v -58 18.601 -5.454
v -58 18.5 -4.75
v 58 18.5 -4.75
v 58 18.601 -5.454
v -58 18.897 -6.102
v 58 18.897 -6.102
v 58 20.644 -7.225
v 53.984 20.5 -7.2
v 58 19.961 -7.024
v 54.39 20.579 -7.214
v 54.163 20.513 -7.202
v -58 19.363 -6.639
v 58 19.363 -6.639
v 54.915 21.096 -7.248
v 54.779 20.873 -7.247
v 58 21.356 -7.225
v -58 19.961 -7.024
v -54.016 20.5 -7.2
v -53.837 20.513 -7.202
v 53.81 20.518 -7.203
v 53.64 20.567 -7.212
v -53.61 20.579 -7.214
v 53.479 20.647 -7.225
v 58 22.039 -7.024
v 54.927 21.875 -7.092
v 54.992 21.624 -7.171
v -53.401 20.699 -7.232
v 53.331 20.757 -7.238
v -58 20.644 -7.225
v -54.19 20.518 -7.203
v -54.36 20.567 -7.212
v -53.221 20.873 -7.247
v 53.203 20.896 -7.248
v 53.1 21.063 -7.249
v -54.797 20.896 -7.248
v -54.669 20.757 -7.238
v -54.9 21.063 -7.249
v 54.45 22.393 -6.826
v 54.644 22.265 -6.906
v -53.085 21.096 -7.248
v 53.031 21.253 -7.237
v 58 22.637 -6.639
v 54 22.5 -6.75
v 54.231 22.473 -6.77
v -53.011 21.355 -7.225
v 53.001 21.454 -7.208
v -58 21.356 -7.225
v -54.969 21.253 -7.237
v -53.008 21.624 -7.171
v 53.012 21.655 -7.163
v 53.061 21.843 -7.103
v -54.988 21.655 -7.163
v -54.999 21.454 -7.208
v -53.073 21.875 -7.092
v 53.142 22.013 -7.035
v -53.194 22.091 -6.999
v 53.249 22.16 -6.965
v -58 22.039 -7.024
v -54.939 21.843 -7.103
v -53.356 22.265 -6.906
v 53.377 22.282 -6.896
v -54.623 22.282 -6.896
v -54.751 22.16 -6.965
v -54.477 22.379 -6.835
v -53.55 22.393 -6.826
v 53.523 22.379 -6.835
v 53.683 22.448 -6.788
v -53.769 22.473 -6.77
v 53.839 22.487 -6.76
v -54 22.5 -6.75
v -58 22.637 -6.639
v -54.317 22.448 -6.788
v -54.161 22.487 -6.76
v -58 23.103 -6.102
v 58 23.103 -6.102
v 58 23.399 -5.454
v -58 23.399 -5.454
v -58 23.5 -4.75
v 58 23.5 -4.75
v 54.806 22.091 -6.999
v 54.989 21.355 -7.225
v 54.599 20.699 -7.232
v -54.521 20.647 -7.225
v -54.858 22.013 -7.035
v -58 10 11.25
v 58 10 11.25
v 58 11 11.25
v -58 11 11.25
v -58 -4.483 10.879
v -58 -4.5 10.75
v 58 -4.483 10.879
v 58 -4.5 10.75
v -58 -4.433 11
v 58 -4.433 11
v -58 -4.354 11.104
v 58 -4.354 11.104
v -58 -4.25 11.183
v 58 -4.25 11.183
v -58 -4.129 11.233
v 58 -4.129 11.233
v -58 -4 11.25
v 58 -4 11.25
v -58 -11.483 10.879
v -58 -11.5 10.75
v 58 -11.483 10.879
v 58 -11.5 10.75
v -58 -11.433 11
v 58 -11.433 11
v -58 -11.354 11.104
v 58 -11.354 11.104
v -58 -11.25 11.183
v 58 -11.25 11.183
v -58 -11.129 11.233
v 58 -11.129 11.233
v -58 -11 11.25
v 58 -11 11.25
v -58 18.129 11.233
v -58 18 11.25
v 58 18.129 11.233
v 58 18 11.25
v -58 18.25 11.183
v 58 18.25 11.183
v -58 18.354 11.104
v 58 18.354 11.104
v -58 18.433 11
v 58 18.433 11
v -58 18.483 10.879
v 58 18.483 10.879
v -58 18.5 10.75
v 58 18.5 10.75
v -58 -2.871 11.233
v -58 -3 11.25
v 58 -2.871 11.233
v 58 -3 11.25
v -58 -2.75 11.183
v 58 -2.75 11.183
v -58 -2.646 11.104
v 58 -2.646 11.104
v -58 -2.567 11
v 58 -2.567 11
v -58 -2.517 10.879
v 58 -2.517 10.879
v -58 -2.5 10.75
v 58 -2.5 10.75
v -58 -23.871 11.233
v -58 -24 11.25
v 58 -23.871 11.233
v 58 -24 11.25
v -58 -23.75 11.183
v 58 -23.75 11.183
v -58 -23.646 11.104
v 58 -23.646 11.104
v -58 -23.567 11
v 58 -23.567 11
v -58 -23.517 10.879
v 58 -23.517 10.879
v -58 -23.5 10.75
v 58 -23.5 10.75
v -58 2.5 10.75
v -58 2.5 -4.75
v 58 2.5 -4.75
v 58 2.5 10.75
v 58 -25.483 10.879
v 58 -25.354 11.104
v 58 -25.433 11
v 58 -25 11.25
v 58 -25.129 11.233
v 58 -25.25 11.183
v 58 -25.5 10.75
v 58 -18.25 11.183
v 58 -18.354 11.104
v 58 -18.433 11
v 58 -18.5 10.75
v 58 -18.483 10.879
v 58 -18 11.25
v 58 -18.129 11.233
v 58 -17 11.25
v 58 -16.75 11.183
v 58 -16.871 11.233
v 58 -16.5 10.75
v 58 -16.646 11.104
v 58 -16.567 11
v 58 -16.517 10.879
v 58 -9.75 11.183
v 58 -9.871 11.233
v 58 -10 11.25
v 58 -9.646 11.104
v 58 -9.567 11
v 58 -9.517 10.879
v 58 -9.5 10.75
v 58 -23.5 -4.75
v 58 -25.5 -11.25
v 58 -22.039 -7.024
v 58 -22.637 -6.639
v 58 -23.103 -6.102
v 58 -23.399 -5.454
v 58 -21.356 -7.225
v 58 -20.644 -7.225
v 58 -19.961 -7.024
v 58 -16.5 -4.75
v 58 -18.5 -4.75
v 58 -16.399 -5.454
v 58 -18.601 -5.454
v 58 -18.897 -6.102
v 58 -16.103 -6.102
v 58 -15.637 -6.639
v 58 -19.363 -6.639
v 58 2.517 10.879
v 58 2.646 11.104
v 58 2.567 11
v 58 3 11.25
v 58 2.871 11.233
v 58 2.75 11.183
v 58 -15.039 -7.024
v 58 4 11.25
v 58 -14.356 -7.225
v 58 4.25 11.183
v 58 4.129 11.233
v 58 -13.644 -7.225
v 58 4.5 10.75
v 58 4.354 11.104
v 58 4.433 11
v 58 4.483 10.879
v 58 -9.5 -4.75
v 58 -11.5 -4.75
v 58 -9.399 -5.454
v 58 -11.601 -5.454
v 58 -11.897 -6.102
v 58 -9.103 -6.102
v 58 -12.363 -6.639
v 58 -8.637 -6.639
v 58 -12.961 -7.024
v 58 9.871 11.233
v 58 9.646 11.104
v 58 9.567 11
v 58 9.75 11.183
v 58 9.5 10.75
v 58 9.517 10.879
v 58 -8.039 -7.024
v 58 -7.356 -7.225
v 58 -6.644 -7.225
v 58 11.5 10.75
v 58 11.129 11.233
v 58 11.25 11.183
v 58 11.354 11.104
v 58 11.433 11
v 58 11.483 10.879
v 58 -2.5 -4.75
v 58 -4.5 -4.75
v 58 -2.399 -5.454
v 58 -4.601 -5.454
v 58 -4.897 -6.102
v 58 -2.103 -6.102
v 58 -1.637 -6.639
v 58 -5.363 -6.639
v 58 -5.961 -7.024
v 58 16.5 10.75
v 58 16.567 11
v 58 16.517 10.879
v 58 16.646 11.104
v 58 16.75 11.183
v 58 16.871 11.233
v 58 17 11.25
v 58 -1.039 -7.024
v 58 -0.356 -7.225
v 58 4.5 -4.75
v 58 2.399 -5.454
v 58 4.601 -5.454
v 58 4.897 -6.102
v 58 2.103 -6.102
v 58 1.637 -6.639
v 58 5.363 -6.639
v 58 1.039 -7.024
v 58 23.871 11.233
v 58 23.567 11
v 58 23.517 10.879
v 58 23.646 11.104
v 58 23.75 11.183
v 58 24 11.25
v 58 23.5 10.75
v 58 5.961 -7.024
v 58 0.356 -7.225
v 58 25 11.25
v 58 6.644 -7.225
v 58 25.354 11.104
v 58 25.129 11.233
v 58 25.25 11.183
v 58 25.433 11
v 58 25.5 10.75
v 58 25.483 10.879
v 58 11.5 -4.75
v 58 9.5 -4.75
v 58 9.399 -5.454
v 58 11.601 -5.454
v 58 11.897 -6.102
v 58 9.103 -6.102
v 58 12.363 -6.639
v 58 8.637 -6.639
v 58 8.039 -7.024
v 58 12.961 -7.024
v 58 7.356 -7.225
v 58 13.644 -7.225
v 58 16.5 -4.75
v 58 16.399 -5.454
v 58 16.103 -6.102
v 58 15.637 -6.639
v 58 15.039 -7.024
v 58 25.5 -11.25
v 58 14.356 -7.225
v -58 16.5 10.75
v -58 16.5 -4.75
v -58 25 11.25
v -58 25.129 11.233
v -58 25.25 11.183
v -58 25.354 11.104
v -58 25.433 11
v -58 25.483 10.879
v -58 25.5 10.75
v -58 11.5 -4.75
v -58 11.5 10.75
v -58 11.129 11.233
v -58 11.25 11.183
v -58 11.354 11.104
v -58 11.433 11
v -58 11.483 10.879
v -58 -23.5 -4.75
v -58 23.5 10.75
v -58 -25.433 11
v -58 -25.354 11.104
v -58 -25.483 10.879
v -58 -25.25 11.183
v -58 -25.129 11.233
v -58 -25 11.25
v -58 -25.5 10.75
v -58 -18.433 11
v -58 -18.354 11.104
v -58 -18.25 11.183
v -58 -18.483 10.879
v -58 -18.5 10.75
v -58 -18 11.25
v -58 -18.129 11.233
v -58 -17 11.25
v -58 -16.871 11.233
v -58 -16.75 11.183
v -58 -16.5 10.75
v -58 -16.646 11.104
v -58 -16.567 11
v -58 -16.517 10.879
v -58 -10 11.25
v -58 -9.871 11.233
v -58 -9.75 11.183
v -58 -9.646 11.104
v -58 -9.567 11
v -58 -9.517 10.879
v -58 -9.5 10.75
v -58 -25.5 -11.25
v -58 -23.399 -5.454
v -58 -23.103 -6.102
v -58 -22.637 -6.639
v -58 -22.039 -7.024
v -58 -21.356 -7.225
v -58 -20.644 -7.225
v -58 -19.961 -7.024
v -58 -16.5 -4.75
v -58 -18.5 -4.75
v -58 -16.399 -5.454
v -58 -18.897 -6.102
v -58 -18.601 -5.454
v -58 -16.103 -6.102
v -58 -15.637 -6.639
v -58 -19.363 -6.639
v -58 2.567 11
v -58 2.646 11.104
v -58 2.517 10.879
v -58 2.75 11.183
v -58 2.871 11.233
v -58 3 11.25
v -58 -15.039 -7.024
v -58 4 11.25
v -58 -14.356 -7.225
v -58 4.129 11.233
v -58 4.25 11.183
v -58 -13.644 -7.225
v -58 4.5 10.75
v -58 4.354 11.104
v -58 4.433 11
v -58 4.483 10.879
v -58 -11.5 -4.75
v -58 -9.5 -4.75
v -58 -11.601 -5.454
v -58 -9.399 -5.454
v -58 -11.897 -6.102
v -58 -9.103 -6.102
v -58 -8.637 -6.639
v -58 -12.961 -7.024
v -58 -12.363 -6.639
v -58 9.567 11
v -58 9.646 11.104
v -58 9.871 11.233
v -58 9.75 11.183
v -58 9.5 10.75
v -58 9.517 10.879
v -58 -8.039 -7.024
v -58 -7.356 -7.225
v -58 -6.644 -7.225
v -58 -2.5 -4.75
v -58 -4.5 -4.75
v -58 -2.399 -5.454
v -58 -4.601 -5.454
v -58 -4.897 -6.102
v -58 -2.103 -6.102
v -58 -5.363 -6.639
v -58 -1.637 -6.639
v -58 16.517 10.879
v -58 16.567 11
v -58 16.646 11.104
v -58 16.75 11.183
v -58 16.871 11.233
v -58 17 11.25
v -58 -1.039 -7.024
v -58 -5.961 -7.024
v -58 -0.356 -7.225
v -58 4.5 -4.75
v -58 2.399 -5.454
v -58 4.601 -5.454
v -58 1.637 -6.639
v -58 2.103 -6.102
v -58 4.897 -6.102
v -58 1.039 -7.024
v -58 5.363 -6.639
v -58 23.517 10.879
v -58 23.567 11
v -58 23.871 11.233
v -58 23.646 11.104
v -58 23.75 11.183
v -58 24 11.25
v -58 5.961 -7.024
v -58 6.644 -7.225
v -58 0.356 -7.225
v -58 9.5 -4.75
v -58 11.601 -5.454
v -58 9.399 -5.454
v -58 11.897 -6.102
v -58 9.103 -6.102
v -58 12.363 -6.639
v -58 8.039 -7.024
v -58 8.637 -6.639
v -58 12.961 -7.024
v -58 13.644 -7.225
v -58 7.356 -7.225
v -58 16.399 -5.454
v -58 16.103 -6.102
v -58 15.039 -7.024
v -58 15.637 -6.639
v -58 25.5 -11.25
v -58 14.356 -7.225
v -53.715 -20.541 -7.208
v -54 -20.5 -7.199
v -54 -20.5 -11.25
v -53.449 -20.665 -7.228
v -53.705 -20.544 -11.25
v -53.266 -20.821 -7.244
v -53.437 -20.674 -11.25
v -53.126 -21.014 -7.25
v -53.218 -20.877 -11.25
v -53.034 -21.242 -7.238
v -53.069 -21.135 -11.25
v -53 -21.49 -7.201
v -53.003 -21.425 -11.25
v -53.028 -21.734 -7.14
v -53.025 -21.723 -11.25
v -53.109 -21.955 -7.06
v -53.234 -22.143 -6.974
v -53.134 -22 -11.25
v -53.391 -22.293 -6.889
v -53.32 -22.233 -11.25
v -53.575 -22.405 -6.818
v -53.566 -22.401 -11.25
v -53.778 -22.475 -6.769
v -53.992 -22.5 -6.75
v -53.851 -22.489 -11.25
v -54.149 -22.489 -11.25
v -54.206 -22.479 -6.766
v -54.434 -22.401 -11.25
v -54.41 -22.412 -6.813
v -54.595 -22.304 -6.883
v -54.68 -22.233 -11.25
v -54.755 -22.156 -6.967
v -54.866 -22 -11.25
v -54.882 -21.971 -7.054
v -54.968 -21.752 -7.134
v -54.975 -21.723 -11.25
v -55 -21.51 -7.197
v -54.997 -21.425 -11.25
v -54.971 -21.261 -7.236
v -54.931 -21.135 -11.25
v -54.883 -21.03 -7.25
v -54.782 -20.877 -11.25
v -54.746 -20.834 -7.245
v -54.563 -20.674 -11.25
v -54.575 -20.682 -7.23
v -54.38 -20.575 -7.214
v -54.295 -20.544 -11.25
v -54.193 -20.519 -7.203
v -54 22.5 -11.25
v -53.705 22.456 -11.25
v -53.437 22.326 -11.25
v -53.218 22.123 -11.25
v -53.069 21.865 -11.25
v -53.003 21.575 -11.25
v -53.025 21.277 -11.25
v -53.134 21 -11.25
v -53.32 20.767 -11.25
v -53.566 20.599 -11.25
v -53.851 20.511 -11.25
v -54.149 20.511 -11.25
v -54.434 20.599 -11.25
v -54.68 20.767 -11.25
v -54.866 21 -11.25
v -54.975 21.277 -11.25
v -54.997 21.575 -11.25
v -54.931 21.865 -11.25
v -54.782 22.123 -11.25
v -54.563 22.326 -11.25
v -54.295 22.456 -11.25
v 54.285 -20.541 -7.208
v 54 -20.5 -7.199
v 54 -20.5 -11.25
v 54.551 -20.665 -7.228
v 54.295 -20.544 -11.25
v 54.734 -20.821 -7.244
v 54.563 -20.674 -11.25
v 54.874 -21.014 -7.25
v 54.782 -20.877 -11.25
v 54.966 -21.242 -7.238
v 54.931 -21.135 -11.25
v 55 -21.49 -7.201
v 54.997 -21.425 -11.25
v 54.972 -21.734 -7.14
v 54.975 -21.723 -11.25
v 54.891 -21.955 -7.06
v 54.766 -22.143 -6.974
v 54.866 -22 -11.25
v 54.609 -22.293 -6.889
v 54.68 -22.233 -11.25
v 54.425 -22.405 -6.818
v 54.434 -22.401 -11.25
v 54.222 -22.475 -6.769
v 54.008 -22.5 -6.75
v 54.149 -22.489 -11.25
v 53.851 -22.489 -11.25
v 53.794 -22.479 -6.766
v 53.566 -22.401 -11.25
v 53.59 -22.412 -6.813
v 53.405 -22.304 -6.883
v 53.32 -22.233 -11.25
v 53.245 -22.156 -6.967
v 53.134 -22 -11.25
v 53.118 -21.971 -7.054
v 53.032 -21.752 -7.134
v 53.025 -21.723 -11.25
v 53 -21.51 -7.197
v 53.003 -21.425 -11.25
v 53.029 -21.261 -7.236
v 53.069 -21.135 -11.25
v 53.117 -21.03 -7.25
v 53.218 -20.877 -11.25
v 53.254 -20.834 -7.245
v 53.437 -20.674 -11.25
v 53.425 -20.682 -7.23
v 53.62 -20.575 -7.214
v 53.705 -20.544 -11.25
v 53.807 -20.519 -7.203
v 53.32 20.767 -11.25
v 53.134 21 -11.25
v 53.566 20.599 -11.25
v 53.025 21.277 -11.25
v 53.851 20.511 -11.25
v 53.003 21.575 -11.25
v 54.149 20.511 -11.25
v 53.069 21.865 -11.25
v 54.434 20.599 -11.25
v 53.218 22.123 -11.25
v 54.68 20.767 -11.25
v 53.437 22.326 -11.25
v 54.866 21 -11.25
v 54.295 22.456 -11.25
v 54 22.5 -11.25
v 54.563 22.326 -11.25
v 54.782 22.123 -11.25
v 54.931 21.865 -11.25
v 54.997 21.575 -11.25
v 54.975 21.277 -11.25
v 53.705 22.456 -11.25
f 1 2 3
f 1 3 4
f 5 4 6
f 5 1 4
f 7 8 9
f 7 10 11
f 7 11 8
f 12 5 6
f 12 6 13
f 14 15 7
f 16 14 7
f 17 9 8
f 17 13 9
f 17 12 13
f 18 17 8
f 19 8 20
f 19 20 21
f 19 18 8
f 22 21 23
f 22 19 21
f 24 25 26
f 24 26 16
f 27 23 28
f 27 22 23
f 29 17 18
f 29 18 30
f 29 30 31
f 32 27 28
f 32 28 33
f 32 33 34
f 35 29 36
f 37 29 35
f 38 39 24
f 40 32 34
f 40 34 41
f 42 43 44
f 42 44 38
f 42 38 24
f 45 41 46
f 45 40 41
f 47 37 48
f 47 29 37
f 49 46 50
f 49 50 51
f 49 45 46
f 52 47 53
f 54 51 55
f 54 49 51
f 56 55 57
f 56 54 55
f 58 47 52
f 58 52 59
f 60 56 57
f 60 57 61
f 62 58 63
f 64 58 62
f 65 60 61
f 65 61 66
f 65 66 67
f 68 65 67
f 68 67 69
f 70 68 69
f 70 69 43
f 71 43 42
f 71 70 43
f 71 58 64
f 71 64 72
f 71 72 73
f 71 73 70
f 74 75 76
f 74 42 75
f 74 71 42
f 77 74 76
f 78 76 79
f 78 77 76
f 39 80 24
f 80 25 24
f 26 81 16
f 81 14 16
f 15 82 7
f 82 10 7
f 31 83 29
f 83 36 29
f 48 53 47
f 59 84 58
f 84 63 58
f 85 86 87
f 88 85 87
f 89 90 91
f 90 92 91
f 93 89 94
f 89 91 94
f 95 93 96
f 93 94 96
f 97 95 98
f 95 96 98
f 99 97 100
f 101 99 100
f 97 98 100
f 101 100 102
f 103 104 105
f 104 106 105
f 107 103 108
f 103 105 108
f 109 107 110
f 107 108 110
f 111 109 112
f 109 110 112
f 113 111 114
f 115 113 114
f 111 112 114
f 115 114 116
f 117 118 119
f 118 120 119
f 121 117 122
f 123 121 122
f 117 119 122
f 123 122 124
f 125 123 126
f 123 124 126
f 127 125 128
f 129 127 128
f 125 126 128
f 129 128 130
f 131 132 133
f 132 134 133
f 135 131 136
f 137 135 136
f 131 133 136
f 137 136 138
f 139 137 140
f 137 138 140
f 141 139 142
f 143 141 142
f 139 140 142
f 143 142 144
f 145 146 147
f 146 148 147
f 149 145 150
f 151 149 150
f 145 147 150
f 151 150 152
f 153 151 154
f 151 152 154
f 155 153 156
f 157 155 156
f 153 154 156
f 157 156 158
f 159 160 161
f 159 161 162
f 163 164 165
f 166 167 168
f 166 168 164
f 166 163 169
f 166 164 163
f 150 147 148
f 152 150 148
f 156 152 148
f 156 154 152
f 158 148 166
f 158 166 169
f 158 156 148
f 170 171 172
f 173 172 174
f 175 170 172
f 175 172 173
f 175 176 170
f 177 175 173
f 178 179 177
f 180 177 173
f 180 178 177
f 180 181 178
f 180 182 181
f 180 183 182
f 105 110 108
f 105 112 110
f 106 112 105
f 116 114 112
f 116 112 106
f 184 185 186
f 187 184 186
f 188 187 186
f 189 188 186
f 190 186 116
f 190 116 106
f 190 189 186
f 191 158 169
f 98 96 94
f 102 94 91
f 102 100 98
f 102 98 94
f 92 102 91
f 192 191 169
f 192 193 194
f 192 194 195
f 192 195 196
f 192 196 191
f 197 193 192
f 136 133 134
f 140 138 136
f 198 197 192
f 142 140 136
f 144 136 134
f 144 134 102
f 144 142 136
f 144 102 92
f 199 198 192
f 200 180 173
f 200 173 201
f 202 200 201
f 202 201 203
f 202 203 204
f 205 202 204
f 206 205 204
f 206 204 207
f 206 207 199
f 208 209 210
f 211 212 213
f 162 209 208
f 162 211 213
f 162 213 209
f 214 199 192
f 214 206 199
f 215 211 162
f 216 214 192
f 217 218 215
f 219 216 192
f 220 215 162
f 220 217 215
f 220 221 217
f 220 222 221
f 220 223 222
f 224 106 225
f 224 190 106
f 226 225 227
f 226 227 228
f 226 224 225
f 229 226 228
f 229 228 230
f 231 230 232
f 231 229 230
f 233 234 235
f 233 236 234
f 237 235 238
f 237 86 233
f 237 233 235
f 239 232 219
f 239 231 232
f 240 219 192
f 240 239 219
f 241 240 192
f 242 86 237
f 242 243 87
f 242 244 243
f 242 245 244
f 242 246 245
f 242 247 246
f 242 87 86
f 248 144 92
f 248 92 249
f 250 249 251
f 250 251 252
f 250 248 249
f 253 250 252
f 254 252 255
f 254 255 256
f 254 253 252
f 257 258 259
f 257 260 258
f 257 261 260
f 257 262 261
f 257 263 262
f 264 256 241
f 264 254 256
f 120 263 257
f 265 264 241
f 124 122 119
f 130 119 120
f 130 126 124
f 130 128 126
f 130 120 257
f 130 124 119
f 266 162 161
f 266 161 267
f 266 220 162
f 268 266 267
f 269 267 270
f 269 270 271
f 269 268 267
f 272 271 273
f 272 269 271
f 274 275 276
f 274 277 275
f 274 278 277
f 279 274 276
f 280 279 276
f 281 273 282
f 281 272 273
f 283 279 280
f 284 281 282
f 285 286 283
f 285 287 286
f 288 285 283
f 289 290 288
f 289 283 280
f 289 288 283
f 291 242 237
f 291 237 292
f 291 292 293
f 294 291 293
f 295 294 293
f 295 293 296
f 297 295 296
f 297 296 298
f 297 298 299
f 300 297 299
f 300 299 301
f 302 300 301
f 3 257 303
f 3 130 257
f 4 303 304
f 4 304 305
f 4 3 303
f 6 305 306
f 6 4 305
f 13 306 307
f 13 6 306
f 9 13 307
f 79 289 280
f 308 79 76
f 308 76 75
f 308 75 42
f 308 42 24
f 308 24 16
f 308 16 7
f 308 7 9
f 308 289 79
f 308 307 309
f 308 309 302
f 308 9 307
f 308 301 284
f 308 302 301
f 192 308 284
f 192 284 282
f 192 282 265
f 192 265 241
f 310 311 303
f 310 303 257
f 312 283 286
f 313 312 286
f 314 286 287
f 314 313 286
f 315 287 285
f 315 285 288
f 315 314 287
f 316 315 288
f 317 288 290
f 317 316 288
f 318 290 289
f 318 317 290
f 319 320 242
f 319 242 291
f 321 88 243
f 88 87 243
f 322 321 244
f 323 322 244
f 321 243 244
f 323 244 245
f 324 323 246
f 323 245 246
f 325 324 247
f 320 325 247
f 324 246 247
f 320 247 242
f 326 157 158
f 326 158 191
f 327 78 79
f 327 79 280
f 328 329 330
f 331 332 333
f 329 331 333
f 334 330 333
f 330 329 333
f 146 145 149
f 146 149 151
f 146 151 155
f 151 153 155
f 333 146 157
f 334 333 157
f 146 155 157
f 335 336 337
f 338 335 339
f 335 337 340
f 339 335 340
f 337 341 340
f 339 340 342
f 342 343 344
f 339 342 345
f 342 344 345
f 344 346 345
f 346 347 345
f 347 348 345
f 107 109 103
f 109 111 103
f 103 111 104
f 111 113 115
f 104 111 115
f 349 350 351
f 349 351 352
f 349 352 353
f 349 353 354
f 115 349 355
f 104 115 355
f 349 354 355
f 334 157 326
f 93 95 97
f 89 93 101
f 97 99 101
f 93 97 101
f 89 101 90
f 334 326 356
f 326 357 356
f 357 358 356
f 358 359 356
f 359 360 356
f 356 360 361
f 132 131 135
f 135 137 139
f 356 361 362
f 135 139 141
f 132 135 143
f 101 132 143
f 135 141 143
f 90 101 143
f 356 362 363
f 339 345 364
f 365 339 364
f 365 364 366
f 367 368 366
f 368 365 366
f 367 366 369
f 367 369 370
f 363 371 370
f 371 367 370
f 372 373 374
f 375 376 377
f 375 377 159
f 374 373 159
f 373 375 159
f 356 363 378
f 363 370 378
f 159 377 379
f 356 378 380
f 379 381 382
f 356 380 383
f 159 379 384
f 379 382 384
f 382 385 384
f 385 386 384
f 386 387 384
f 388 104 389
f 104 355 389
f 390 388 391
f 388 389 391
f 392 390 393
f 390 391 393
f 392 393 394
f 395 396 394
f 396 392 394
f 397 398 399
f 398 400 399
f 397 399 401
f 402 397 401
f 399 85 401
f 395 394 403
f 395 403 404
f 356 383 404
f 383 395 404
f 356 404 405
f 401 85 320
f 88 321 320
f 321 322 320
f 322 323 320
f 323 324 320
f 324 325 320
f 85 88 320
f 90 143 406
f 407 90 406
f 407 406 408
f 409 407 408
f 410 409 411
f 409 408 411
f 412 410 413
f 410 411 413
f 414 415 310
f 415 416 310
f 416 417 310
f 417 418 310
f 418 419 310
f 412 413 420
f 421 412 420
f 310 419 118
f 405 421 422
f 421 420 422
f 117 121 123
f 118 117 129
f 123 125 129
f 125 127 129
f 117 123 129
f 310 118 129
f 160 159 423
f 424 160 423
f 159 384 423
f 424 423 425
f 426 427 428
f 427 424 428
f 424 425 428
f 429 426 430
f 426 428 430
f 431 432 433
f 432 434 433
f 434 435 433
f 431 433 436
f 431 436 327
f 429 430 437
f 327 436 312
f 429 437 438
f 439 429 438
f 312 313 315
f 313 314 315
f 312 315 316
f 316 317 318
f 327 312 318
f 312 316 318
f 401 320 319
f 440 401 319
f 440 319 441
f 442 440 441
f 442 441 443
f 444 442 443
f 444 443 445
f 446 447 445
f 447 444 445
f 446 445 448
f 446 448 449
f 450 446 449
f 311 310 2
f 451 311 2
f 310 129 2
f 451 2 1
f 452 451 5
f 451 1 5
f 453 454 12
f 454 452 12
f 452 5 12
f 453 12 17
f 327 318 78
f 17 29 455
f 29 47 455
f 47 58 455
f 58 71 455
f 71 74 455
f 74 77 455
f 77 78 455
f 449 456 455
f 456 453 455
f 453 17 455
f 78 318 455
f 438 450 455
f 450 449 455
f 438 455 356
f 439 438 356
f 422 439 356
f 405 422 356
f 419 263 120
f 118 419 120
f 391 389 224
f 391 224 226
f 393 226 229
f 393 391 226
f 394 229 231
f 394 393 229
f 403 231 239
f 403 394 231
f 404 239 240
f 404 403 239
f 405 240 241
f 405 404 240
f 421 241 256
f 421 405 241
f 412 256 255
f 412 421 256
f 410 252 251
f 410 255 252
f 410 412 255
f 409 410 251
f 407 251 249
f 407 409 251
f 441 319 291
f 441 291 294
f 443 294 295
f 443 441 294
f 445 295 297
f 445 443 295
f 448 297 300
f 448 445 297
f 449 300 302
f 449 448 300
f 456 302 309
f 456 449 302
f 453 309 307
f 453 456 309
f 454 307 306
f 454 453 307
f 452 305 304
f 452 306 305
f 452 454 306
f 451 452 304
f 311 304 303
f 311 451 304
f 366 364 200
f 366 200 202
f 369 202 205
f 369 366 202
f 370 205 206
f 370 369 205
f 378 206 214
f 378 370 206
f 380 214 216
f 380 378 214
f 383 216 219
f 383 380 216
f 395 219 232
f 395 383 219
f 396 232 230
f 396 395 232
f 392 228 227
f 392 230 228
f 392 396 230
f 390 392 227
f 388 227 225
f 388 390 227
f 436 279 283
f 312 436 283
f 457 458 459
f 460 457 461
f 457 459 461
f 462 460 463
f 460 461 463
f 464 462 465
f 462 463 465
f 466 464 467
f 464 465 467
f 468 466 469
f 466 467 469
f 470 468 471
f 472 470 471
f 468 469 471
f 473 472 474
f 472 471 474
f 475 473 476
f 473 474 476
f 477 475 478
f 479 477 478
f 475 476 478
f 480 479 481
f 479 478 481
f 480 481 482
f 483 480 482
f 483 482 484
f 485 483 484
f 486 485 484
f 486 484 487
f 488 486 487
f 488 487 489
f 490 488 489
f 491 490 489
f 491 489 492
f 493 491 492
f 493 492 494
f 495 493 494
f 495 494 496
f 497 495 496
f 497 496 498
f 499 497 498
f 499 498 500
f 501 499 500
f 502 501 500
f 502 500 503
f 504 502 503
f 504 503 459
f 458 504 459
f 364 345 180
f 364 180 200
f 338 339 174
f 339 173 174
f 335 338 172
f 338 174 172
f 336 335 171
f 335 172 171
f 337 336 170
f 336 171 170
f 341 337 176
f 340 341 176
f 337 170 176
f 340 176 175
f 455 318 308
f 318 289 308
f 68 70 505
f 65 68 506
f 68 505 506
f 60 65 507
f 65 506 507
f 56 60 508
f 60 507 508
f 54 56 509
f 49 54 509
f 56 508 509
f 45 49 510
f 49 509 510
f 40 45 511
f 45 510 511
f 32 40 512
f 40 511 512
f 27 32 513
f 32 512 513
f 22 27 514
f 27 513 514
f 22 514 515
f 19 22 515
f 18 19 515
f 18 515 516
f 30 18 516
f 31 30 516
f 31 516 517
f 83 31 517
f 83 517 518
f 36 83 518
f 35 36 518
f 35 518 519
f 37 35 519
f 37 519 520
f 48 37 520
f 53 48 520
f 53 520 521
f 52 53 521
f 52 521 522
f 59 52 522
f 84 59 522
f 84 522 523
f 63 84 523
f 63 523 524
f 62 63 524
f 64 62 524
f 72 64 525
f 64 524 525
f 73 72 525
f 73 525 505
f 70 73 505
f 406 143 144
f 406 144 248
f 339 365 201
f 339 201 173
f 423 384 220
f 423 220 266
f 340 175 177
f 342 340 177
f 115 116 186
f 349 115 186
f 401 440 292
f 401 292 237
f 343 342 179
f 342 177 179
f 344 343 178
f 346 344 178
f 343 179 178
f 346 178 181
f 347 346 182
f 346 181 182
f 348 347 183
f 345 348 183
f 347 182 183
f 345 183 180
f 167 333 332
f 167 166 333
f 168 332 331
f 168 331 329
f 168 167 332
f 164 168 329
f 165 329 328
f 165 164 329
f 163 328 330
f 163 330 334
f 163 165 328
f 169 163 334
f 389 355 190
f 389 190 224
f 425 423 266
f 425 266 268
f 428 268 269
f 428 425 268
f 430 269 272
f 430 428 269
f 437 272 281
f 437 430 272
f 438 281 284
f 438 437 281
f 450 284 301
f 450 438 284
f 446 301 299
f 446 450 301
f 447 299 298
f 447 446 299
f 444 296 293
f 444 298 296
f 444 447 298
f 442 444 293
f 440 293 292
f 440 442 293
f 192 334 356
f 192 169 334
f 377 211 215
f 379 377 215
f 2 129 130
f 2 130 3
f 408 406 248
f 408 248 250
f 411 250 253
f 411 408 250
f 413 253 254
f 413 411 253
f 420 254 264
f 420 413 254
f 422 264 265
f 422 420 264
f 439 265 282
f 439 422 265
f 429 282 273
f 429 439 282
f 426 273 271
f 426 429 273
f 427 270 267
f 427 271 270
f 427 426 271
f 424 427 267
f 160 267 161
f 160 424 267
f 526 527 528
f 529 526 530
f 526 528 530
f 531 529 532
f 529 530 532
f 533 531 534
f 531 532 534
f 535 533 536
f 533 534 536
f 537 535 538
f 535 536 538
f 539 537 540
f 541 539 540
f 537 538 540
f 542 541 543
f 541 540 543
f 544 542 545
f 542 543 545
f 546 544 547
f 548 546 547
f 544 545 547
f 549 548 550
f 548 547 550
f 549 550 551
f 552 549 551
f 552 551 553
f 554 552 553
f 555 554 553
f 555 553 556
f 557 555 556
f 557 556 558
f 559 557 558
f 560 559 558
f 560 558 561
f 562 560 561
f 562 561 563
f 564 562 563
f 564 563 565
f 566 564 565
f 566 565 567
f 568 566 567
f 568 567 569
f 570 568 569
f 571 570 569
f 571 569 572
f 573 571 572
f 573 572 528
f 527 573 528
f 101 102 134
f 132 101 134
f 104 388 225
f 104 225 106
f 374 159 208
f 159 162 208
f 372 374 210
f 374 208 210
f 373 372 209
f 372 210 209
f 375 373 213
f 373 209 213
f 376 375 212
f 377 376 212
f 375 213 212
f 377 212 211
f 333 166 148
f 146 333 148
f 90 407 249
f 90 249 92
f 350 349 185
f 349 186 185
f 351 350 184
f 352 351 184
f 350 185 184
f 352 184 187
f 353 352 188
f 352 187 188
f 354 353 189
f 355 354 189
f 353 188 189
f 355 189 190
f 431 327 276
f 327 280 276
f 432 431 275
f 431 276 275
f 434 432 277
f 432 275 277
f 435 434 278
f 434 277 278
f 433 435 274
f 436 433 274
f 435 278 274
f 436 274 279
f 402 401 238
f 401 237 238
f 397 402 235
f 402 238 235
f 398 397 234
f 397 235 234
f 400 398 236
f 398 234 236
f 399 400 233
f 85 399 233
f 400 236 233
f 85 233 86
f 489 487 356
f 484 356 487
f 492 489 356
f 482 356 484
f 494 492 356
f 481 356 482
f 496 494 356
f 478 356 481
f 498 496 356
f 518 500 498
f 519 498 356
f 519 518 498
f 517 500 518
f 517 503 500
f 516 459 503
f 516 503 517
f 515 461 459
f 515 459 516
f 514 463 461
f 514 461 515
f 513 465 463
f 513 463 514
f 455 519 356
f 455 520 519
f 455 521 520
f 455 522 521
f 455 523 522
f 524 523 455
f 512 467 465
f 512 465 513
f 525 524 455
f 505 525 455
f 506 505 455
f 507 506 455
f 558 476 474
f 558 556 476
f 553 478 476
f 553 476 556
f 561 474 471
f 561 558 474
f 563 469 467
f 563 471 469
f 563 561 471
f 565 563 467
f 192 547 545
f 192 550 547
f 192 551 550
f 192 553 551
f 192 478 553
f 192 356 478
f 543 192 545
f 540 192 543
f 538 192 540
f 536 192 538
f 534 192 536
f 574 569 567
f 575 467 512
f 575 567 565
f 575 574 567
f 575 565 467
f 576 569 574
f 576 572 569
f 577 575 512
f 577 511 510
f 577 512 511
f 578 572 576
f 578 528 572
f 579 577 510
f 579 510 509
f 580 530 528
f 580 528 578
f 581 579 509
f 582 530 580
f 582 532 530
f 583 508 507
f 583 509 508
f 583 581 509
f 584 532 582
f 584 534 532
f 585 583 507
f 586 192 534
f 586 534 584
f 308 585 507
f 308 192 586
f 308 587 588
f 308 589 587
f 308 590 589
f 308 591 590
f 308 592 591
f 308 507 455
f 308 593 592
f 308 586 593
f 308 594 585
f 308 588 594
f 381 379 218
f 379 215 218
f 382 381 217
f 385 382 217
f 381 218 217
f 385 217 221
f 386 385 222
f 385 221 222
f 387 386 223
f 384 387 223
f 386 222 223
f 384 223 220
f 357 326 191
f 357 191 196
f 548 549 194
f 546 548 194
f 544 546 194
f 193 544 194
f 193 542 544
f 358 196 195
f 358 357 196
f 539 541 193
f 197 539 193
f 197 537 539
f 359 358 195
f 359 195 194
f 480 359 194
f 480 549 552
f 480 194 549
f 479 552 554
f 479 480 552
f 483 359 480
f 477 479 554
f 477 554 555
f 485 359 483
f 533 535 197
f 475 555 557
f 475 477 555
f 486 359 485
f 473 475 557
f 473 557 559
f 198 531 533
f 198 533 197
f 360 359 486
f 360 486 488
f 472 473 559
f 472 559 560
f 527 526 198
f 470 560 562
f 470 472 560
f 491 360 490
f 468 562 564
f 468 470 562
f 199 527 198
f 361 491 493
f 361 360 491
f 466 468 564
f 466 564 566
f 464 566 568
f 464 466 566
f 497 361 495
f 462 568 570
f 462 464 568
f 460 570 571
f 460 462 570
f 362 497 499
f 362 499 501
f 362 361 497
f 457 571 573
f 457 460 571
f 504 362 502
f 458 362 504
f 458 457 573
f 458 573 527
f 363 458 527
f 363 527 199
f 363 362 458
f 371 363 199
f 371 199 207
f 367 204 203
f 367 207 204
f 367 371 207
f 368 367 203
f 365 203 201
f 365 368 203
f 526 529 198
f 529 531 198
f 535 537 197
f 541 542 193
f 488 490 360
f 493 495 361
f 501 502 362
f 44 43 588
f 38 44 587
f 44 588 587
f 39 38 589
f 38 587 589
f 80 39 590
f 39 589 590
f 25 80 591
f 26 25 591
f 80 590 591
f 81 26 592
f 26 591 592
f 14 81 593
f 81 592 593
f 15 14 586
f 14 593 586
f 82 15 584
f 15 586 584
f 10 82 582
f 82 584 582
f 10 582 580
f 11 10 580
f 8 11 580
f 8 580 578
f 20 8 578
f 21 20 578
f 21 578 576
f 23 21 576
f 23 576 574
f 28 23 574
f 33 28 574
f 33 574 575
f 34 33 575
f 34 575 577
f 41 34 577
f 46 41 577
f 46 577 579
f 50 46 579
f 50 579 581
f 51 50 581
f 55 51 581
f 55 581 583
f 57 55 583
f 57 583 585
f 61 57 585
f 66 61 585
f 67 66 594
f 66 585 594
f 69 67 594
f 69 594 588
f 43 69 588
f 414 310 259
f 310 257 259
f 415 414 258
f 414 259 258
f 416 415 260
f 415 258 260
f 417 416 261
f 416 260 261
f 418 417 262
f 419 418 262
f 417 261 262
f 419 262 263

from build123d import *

# Parameters (mm, degrees)
SKETCH1_W           = 22.5
SKETCH1_H           = 51
BOSS_EXTRUDE1_DEPTH = 58
CUT_EXTRUDE1_REACH  = 121.301
LPATTERN1_COUNT     = 4
LPATTERN1_PITCH     = 7
LPATTERN1_COL_COUNT = 4
LPATTERN1_COL_PITCH = 7
FILLET1_R           = 0.5
CUT_EXTRUDE2_REACH  = 69.235
SKETCH3_R           = 1


with BuildPart() as part:
    # Sketch1 → Boss-Extrude1 (new, symmetric)
    with BuildSketch(Plane(origin=(0, 0, 0), x_dir=(0, 0, -1), z_dir=(1, 0, 0))):
        Rectangle(SKETCH1_W, SKETCH1_H)
    extrude(amount=BOSS_EXTRUDE1_DEPTH, both=True)

    # Sketch2 → Cut-Extrude1 (cut, up to next)
    with BuildSketch(Plane.ZY.offset(58), mode=Mode.PRIVATE) as cut_extrude1_sk1:
        with BuildLine():
            Line((-4.75, 2.5), (11.25, 2.5))
            Line((11.25, 2.5), (11.25, -2.5))
            Line((11.25, -2.5), (-4.75, -2.5))
            ThreePointArc((-4.75, -2.5), (-7.25, 0), (-4.75, 2.5))
        make_face()
    cut_extrude1_tool1 = extrude(cut_extrude1_sk1.sketch, amount=-CUT_EXTRUDE1_REACH, mode=Mode.PRIVATE) & part.part
    cut_extrude1 = cut_extrude1_tool1.solids().sort_by_distance((-58, 0, 2.259586))[0]
    add(cut_extrude1, mode=Mode.SUBTRACT)

    # LPattern1: Cut-Extrude1 ×4
    with Locations(*[(0, -i * LPATTERN1_PITCH, 0) for i in range(1, LPATTERN1_COUNT)]):
        add(cut_extrude1, mode=Mode.SUBTRACT)

    # LPattern1 col: Cut-Extrude1 ×4
    with Locations(*[(0, i * LPATTERN1_COL_PITCH, 0) for i in range(1, LPATTERN1_COL_COUNT)]):
        add(cut_extrude1, mode=Mode.SUBTRACT)

    # Fillet1
    fillet1_edges = [part.edges().sort_by_distance(p)[0] for p in [
        (0, 2.5, 11.25),
        (0, -2.5, 11.25),
        (0, 9.5, 11.25),
        (0, 4.5, 11.25),
        (0, -18.5, 11.25),
        (0, -23.5, 11.25),
        (0, -4.5, 11.25),
        (0, -9.5, 11.25),
        (0, 23.5, 11.25),
        (0, 18.5, 11.25),
        (0, -25.5, 11.25),
        (0, 25.5, 11.25),
        (0, 16.5, 11.25),
        (0, 11.5, 11.25),
        (0, -11.5, 11.25),
        (0, -16.5, 11.25),
    ]]
    fillet(fillet1_edges, radius=FILLET1_R)

    # Sketch3 → Cut-Extrude2 (cut, up to next)
    with BuildSketch(Plane(origin=(0, 0, -11.25), x_dir=(-1, 0, 0), z_dir=(0, 0, -1)), mode=Mode.PRIVATE) as cut_extrude2_sk1:
        with Locations(Location((-54, 21.5, 0), (0, 0, 90))):
            Circle(SKETCH3_R)
    cut_extrude2_tool1 = extrude(cut_extrude2_sk1.sketch, amount=-CUT_EXTRUDE2_REACH, mode=Mode.PRIVATE) & part.part
    # Sketch3 → Cut-Extrude2 (cut, up to next)
    with BuildSketch(Plane(origin=(0, 0, -11.25), x_dir=(-1, 0, 0), z_dir=(0, 0, -1)), mode=Mode.PRIVATE) as cut_extrude2_sk2:
        with Locations(Location((-54, -21.5, 0), (0, 0, 90))):
            Circle(SKETCH3_R)
    cut_extrude2_tool2 = extrude(cut_extrude2_sk2.sketch, amount=-CUT_EXTRUDE2_REACH, mode=Mode.PRIVATE) & part.part
    # Sketch3 → Cut-Extrude2 (cut, up to next)
    with BuildSketch(Plane(origin=(0, 0, -11.25), x_dir=(-1, 0, 0), z_dir=(0, 0, -1)), mode=Mode.PRIVATE) as cut_extrude2_sk3:
        with Locations(Location((54, -21.5, 0), (0, 0, 90))):
            Circle(SKETCH3_R)
    cut_extrude2_tool3 = extrude(cut_extrude2_sk3.sketch, amount=-CUT_EXTRUDE2_REACH, mode=Mode.PRIVATE) & part.part
    # Sketch3 → Cut-Extrude2 (cut, up to next)
    with BuildSketch(Plane(origin=(0, 0, -11.25), x_dir=(-1, 0, 0), z_dir=(0, 0, -1)), mode=Mode.PRIVATE) as cut_extrude2_sk4:
        with Locations(Location((54, 21.5, 0), (0, 0, 90))):
            Circle(SKETCH3_R)
    cut_extrude2_tool4 = extrude(cut_extrude2_sk4.sketch, amount=-CUT_EXTRUDE2_REACH, mode=Mode.PRIVATE) & part.part
    add(cut_extrude2_tool1.solids().sort_by_distance((54, 21.5, -11.25))[0], mode=Mode.SUBTRACT)
    add(cut_extrude2_tool2.solids().sort_by_distance((54, -21.5, -11.25))[0], mode=Mode.SUBTRACT)
    add(cut_extrude2_tool3.solids().sort_by_distance((-54, -21.5, -11.25))[0], mode=Mode.SUBTRACT)
    add(cut_extrude2_tool4.solids().sort_by_distance((-54, 21.5, -11.25))[0], mode=Mode.SUBTRACT)


solid = part.part
